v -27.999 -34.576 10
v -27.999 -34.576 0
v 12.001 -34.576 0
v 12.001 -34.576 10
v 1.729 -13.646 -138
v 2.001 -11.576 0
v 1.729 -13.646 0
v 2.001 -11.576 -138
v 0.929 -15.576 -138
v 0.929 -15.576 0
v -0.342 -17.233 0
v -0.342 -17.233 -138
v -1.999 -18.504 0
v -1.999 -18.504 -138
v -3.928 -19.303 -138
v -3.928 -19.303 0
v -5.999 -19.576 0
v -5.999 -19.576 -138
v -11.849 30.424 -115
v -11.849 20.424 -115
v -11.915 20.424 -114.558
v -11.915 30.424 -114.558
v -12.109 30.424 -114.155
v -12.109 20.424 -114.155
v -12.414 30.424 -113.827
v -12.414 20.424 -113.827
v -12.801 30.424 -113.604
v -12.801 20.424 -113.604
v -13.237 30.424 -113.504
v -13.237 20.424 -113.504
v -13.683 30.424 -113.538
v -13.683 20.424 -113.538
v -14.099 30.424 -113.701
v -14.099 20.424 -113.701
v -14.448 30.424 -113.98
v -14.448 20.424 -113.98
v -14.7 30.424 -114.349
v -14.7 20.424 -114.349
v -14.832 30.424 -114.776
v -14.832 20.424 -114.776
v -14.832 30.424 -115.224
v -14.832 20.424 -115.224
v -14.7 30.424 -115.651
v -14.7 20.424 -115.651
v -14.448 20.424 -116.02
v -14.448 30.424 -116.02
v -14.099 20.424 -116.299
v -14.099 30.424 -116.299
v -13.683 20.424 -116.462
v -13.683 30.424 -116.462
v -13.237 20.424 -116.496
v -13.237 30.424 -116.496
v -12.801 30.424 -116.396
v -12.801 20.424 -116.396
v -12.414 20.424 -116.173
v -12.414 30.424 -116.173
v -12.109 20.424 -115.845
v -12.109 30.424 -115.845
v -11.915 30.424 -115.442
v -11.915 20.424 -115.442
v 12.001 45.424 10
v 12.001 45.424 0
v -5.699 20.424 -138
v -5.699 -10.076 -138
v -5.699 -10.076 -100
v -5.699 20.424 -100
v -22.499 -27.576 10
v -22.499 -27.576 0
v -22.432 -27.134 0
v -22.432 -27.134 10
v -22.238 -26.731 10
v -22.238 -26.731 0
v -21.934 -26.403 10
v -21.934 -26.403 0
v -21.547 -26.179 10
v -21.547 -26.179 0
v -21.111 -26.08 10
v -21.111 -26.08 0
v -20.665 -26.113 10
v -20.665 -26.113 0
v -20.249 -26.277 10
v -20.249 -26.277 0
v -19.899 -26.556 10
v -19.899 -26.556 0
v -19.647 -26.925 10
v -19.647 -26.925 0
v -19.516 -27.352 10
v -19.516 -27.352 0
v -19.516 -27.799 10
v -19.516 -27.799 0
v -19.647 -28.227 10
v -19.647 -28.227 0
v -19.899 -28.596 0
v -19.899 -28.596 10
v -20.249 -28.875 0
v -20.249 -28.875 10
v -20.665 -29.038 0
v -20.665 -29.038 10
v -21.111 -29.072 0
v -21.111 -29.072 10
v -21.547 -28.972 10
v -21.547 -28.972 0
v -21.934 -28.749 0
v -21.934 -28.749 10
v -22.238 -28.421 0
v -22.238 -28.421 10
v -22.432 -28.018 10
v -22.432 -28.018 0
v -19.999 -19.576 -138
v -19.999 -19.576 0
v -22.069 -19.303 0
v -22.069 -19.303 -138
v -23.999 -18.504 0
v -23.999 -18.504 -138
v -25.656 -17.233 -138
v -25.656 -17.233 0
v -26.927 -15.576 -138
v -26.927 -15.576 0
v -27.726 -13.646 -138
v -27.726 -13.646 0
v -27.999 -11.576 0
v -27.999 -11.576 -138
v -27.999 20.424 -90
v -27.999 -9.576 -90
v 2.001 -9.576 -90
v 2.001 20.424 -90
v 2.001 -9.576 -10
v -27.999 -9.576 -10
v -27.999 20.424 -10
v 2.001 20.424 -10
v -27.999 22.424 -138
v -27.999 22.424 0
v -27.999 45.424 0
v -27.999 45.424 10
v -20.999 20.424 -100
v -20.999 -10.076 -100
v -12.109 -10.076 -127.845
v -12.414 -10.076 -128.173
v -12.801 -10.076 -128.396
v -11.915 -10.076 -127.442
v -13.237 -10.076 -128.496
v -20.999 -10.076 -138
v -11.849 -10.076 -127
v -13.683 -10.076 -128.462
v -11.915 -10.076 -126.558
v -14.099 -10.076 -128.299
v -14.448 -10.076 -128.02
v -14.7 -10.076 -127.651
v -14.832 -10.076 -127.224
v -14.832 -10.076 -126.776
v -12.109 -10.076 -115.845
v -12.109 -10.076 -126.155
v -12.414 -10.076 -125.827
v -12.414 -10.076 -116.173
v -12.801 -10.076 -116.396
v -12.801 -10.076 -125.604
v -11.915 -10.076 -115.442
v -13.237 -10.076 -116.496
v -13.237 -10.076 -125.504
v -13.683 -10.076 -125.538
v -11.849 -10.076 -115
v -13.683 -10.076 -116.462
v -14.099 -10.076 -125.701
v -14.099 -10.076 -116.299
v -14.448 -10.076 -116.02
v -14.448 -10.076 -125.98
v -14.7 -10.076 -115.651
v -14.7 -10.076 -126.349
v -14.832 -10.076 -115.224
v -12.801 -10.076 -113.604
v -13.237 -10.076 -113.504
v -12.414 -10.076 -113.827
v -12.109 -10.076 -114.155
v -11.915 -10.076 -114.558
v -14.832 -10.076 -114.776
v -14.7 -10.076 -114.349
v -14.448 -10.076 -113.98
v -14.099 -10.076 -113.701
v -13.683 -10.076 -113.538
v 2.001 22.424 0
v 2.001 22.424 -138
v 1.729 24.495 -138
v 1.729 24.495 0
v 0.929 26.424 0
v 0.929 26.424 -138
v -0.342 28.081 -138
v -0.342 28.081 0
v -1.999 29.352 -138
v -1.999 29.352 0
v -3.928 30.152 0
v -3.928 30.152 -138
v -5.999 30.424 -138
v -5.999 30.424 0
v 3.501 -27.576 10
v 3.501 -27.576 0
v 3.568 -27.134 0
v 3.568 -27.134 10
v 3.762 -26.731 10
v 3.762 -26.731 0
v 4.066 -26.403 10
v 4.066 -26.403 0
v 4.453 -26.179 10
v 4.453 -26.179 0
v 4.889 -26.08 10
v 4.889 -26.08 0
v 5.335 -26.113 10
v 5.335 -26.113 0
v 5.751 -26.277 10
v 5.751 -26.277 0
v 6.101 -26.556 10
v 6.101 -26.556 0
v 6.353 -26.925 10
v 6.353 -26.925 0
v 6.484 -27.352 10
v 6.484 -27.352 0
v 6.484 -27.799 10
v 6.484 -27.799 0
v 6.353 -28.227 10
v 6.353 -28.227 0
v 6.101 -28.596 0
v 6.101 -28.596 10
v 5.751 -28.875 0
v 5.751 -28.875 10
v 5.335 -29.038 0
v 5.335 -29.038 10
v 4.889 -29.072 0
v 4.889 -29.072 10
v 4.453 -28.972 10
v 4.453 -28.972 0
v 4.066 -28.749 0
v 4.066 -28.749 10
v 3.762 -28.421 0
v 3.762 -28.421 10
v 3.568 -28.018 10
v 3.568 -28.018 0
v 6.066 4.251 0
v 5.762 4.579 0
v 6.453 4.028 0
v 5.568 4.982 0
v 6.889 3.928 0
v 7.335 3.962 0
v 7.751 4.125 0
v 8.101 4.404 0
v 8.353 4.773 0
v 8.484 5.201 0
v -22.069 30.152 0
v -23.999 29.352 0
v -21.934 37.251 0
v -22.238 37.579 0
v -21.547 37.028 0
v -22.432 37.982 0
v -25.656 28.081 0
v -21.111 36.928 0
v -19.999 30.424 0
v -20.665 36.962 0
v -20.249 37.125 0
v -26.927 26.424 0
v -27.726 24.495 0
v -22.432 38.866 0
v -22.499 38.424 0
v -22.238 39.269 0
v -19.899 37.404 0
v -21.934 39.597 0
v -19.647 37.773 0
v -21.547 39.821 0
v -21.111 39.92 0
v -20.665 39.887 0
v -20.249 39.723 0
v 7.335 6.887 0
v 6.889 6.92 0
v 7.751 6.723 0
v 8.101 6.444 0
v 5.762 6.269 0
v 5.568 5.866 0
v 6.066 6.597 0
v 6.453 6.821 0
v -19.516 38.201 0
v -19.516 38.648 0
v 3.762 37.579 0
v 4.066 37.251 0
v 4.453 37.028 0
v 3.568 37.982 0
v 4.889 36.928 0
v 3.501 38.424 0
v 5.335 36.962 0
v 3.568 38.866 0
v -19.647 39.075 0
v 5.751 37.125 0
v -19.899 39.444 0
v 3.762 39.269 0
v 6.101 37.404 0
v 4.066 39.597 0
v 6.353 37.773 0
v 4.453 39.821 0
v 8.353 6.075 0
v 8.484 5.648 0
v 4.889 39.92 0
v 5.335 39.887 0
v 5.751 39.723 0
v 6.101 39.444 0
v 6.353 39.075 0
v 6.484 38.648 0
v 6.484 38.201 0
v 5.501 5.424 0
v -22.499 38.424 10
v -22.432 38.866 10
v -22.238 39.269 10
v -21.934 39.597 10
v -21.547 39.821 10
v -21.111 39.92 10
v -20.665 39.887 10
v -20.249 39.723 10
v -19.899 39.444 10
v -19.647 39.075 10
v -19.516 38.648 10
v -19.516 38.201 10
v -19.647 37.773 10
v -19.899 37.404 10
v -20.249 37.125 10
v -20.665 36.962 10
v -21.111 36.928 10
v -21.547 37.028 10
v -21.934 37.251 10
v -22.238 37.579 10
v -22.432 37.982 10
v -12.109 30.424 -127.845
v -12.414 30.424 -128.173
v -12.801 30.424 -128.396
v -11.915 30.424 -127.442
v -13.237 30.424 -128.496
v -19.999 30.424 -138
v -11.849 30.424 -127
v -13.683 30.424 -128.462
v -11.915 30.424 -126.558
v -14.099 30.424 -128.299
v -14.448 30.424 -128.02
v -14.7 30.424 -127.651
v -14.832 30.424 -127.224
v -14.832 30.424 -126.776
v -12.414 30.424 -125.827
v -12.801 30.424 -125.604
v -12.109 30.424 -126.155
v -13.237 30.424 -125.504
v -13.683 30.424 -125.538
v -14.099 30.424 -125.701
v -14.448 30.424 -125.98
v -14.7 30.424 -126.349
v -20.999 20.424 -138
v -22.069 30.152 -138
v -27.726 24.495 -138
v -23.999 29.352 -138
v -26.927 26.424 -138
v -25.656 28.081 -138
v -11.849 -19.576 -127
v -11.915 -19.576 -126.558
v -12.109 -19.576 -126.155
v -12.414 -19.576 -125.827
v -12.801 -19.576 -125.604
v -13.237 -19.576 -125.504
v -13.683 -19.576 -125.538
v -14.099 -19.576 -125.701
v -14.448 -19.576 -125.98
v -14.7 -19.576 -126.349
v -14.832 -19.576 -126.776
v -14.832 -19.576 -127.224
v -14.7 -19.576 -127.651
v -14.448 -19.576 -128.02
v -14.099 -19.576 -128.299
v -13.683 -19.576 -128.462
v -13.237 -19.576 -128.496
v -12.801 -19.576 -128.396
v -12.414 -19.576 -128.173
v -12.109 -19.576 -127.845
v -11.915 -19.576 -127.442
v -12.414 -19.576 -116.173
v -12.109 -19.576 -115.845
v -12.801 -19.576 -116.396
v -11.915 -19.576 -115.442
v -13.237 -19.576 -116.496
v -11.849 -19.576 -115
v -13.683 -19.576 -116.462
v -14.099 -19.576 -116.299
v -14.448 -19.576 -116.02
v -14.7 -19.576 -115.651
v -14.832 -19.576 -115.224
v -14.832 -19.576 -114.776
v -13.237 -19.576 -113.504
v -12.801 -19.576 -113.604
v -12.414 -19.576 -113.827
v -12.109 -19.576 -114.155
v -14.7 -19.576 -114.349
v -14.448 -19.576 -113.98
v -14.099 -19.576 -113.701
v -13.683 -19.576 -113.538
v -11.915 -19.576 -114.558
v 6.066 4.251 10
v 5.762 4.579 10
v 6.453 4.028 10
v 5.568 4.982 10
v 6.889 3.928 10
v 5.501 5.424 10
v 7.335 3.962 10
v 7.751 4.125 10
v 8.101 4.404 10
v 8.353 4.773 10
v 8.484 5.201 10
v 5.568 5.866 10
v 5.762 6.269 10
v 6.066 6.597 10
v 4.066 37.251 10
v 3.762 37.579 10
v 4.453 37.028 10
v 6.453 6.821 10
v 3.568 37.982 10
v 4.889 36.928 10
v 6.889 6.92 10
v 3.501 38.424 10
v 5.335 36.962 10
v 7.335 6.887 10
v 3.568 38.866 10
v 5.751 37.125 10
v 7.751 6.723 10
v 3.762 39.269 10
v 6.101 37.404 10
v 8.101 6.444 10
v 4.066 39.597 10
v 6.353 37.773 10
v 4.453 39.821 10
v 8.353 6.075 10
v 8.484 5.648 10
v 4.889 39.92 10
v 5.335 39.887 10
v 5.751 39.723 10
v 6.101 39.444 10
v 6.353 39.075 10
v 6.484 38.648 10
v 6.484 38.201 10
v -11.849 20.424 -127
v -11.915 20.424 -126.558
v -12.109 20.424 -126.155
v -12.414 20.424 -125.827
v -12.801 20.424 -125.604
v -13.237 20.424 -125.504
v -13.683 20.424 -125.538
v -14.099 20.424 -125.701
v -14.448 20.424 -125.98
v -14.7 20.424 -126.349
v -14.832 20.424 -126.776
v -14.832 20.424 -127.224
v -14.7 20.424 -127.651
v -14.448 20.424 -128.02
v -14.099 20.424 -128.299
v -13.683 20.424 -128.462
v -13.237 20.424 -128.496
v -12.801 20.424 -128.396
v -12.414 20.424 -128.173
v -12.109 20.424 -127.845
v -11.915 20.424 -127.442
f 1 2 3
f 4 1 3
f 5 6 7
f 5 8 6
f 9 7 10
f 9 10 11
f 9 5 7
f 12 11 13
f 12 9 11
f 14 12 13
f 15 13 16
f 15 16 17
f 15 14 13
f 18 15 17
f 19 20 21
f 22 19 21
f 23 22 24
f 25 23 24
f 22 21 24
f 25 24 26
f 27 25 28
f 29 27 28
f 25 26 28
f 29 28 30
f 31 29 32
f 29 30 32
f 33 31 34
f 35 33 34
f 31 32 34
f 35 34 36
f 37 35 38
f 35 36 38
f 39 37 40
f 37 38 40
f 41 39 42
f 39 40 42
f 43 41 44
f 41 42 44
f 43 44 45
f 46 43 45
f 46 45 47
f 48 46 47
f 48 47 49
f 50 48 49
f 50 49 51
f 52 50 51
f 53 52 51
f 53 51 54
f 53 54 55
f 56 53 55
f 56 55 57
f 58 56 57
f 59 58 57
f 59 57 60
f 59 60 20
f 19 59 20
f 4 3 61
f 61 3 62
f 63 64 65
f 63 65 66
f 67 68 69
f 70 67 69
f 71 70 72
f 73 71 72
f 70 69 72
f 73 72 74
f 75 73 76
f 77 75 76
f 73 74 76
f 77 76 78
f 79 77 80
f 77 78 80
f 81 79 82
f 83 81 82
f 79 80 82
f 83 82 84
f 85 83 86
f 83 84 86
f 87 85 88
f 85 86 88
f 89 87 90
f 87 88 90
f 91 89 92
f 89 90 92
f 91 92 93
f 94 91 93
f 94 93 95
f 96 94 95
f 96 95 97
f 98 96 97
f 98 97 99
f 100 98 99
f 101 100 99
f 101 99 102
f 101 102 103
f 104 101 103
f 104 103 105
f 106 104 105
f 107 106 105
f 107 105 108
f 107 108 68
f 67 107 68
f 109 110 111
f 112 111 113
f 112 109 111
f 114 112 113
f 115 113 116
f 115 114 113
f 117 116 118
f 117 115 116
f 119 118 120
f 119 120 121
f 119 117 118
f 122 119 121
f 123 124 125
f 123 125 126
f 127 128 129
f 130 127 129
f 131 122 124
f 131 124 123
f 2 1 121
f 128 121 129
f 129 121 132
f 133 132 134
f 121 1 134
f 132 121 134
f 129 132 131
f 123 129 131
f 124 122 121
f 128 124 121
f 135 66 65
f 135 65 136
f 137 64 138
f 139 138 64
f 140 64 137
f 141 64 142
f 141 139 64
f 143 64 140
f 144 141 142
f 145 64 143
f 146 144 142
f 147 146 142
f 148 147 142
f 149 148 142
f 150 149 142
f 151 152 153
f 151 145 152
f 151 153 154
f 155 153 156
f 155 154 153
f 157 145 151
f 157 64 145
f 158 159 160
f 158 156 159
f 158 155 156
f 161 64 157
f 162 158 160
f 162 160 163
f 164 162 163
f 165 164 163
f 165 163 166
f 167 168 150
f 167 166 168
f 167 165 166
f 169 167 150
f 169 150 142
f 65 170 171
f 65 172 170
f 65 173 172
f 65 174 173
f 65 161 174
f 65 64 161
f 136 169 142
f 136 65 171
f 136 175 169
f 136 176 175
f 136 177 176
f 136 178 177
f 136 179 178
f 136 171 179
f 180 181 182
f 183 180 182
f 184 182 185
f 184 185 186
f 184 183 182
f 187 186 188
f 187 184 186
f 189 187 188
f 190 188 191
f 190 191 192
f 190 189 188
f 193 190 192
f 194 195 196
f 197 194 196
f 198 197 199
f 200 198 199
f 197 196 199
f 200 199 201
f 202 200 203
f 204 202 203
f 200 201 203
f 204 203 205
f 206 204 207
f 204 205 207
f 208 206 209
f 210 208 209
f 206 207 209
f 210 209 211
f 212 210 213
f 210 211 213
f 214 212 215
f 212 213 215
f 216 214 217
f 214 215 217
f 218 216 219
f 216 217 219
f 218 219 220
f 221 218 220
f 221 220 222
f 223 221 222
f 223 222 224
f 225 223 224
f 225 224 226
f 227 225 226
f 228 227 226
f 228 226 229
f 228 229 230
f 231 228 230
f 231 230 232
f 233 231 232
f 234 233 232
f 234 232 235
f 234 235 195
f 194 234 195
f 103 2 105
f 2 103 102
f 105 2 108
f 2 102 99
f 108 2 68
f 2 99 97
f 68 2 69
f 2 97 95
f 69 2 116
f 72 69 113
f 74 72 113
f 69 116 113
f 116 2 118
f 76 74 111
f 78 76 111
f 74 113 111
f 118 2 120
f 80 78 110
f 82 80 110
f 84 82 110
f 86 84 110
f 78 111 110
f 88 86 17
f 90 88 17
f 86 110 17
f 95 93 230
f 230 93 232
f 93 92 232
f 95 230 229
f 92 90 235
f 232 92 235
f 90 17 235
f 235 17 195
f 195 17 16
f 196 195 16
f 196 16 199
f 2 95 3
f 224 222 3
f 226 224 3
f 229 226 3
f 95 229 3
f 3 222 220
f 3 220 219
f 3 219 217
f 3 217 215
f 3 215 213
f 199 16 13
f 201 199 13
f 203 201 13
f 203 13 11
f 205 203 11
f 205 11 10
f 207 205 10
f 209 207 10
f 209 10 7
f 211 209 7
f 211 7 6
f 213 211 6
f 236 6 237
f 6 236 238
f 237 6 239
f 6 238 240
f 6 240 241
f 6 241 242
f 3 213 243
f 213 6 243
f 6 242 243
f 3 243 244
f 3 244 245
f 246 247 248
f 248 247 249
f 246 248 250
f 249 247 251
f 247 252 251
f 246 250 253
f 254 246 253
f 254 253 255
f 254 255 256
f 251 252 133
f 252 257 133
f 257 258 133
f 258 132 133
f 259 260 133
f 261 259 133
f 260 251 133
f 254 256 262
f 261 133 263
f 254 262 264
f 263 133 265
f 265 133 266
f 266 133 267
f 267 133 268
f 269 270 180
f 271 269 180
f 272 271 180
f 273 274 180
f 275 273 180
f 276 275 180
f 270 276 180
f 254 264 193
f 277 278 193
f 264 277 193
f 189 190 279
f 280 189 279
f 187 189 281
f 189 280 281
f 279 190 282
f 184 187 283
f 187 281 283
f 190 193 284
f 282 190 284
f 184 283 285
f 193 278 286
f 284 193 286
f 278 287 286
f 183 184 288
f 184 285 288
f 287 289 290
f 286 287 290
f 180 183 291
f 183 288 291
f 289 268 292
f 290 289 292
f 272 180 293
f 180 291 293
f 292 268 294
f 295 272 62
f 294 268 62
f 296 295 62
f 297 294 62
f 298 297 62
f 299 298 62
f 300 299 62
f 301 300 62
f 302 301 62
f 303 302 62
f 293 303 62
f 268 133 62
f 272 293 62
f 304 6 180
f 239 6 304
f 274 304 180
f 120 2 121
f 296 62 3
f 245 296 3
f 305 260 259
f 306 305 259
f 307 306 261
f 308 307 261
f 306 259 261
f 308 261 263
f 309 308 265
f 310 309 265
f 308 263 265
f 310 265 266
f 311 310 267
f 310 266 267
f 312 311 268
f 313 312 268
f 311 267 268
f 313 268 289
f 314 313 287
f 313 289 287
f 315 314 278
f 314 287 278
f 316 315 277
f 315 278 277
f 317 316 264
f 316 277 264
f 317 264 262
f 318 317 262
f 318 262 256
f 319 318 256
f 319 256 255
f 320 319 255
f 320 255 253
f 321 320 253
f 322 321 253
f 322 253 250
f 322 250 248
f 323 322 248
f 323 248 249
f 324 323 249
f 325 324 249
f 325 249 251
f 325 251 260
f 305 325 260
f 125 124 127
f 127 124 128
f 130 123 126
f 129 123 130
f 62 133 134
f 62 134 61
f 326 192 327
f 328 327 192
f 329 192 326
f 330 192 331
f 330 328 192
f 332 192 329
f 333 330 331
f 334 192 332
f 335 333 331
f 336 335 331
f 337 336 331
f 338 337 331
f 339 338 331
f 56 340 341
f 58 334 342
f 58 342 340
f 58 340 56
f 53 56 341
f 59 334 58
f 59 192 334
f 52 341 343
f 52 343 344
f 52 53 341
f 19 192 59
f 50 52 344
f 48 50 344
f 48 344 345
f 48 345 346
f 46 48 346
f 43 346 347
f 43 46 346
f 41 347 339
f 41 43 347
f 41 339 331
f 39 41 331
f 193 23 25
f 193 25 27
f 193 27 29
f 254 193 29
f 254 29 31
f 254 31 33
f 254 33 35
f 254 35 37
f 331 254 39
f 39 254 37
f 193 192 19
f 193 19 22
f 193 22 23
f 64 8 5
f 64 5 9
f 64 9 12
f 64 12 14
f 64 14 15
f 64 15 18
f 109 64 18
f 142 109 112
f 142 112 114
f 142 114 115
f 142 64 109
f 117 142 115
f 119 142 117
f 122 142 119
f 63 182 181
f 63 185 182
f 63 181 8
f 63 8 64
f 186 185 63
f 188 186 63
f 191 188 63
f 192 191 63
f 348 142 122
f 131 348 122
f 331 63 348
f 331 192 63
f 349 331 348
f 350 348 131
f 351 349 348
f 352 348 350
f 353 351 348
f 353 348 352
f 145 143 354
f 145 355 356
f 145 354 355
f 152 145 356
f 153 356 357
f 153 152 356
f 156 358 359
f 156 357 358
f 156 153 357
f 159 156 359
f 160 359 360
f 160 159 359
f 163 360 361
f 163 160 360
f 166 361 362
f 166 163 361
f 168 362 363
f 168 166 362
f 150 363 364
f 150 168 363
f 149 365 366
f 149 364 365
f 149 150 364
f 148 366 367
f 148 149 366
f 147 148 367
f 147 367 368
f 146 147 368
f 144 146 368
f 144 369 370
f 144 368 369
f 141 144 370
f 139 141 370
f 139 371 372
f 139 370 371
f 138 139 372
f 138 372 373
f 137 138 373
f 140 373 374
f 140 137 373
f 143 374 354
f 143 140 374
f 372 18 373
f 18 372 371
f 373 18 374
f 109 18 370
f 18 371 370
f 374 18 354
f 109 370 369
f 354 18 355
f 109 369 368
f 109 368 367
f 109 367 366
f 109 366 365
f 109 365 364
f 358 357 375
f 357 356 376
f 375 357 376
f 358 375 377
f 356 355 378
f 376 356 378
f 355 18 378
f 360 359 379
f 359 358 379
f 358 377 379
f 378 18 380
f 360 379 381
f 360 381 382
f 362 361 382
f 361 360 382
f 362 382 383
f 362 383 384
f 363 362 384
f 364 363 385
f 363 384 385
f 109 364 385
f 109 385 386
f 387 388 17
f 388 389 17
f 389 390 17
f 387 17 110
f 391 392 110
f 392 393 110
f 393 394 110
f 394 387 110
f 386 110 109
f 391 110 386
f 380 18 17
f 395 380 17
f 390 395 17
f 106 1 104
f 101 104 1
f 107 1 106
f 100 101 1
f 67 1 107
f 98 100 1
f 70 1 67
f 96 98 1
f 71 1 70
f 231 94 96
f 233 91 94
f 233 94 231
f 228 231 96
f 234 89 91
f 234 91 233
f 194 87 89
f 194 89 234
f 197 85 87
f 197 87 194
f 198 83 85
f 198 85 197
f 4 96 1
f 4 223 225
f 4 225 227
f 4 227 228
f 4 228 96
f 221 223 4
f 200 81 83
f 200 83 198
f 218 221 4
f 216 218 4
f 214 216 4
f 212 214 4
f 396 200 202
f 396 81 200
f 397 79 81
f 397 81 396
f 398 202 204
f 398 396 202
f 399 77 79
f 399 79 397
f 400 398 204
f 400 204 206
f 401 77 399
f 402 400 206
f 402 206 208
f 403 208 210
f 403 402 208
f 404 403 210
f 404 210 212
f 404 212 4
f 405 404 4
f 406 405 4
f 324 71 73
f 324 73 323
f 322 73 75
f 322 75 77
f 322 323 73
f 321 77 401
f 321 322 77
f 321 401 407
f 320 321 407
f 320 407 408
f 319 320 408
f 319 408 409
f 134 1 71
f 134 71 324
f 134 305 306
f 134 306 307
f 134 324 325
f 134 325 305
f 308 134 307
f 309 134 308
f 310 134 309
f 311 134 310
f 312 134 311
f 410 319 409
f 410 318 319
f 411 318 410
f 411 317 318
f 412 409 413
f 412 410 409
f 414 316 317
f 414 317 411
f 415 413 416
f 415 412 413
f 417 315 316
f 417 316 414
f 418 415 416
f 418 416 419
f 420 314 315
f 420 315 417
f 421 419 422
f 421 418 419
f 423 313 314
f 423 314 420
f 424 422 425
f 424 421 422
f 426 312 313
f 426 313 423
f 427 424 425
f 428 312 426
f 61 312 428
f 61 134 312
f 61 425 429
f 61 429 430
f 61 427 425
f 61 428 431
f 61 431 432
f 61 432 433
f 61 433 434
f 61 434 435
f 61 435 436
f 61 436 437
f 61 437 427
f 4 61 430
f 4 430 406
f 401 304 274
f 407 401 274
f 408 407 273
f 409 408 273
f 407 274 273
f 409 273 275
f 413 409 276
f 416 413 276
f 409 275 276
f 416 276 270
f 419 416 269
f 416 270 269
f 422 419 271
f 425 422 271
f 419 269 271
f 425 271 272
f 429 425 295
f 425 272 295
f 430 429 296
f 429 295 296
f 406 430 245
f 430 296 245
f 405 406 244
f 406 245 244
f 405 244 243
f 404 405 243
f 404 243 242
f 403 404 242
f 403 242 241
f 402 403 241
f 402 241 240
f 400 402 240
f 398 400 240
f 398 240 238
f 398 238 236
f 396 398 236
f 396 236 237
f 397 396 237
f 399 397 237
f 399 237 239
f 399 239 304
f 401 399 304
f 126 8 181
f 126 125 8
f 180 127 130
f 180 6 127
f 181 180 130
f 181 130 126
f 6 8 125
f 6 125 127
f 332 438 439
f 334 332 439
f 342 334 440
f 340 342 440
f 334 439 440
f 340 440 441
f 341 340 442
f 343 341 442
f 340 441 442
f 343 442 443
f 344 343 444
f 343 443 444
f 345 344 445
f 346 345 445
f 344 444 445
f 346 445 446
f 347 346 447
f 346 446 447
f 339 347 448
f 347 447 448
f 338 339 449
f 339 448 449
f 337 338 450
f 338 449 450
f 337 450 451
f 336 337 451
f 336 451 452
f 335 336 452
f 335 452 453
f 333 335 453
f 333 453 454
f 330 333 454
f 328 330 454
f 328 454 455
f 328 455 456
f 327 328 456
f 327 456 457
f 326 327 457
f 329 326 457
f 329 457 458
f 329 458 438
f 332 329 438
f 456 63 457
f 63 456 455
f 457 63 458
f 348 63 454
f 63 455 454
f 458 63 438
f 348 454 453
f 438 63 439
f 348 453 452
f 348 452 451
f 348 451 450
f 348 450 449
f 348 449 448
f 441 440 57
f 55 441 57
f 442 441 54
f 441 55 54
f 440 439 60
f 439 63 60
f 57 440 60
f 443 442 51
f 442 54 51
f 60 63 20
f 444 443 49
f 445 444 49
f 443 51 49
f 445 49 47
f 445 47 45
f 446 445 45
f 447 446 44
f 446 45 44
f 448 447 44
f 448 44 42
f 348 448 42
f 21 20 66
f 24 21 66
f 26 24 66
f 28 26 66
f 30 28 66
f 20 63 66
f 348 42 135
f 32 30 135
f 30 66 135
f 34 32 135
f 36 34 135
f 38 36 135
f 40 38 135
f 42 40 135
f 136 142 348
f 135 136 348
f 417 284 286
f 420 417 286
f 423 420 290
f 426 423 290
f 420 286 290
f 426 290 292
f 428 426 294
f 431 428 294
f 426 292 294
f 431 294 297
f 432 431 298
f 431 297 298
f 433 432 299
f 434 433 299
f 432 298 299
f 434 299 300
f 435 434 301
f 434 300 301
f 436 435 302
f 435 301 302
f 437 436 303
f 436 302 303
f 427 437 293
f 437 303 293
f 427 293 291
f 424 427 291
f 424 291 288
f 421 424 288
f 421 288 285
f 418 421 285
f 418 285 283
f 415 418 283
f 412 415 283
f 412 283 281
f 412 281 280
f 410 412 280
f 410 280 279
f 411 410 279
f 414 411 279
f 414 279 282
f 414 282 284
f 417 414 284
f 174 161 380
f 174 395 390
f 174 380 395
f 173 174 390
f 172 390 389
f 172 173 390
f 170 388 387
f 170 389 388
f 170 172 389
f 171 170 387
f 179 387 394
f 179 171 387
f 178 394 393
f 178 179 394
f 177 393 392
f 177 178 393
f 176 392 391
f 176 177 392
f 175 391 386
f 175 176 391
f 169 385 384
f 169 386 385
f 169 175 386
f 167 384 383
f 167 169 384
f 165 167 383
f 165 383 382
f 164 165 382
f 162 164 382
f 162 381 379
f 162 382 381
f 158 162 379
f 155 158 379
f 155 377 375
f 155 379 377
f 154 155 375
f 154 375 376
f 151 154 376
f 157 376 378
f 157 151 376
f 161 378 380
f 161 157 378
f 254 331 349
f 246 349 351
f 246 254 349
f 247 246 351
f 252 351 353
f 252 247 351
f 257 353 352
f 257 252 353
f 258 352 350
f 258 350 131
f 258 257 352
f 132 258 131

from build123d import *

# Parameters (mm, degrees)
SKETCH1_W               = 40
SKETCH1_H               = 80
BOSS_EXTRUDE1_DEPTH     = 10
SKETCH2_W               = 30
SKETCH2_H               = 50
BOSS_EXTRUDE2_DEPTH     = 100
SKETCH4_W               = 80
SKETCH4_H               = 30
CUT_EXTRUDE1_DEPTH      = 150
SKETCH3_W               = 30
SKETCH3_H               = 50
SKETCH3_W_2             = 15.3
SKETCH3_H_2             = 30.5
BOSS_EXTRUDE3_DEPTH     = 38
FILLET1_R               = 8
FILLET2_R               = 8
FILLET3_R               = 8
FILLET4_R               = 8
SKETCH5_R               = 1.5
CUT_EXTRUDE2_DEPTH      = 56
CUT_EXTRUDE2_DEPTH_BACK = 26
SKETCH6_R               = 1.5
CUT_EXTRUDE3_DEPTH      = 40


with BuildPart() as part:
    # Sketch1 → Boss-Extrude1 (new body)
    with BuildSketch(Plane.XY):
        with Locations((-7.998819607, 5.424203747)):
            Rectangle(SKETCH1_W, SKETCH1_H)
    extrude(amount=BOSS_EXTRUDE1_DEPTH)

    # Sketch2 → Boss-Extrude2 (add)
    with BuildSketch(Plane(origin=(0, 0, 0), x_dir=(-1, 0, 0), z_dir=(0, 0, -1))):
        with Locations((12.998819607, 5.424203747)):
            Rectangle(SKETCH2_W, SKETCH2_H)
    extrude(amount=BOSS_EXTRUDE2_DEPTH)

    # Sketch4 → Cut-Extrude1 (cut)
    with BuildSketch(Plane.ZY.offset(27.998819607)):
        with Locations((-50, 5.424203747)):
            Rectangle(SKETCH4_W, SKETCH4_H)
    extrude(amount=-CUT_EXTRUDE1_DEPTH, mode=Mode.SUBTRACT)

    # Sketch3 → Boss-Extrude3 (add)
    with BuildSketch(Plane(origin=(0, 0, -100), x_dir=(-1, 0, 0), z_dir=(0, 0, -1))):
        with Locations((12.998819607, 5.424203747)):
            Rectangle(SKETCH3_W, SKETCH3_H)
        with Locations((13.348819607, 5.174203747)):
            Rectangle(SKETCH3_W_2, SKETCH3_H_2, mode=Mode.SUBTRACT)
    extrude(amount=BOSS_EXTRUDE3_DEPTH)

    # Fillet1
    fillet1_edges = [part.edges().sort_by_distance(p)[0] for p in [
        (2.001180393, -19.575796253, -69),
    ]]
    fillet(fillet1_edges, radius=FILLET1_R)

    # Fillet2
    fillet2_edges = [part.edges().sort_by_distance(p)[0] for p in [
        (2.001180393, 30.424203747, -69),
    ]]
    fillet(fillet2_edges, radius=FILLET2_R)

    # Fillet3
    fillet3_edges = [part.edges().sort_by_distance(p)[0] for p in [
        (-27.998819607, -19.575796253, -69),
    ]]
    fillet(fillet3_edges, radius=FILLET3_R)

    # Fillet4
    fillet4_edges = [part.edges().sort_by_distance(p)[0] for p in [
        (-27.998819607, 30.424203747, -69),
    ]]
    fillet(fillet4_edges, radius=FILLET4_R)

    # Sketch5 → Cut-Extrude2 (cut, two sides)
    with BuildSketch(Plane.XZ.offset(-20.424203747)) as cut_extrude2_sk:
        with Locations((-13.348819607, -115)):
            Circle(SKETCH5_R)
        with Locations((-13.348819607, -127)):
            Circle(SKETCH5_R)
    extrude(amount=CUT_EXTRUDE2_DEPTH, mode=Mode.SUBTRACT)
    extrude(cut_extrude2_sk.sketch, amount=-CUT_EXTRUDE2_DEPTH_BACK, mode=Mode.SUBTRACT)

    # Sketch6 → Cut-Extrude3 (cut)
    with BuildSketch(Plane(origin=(0, 0, 0), x_dir=(-1, 0, 0), z_dir=(0, 0, -1))):
        with Locations((20.998819607, 38.424203747)):
            Circle(SKETCH6_R)
        with Locations((-5.001180393, 38.424203747)):
            Circle(SKETCH6_R)
        with Locations((20.998819607, -27.575796253)):
            Circle(SKETCH6_R)
        with Locations((-5.001180393, -27.575796253)):
            Circle(SKETCH6_R)
        with Locations((-7.001180393, 5.424203747)):
            Circle(SKETCH6_R)
    extrude(amount=-CUT_EXTRUDE3_DEPTH, mode=Mode.SUBTRACT)


solid = part.part
